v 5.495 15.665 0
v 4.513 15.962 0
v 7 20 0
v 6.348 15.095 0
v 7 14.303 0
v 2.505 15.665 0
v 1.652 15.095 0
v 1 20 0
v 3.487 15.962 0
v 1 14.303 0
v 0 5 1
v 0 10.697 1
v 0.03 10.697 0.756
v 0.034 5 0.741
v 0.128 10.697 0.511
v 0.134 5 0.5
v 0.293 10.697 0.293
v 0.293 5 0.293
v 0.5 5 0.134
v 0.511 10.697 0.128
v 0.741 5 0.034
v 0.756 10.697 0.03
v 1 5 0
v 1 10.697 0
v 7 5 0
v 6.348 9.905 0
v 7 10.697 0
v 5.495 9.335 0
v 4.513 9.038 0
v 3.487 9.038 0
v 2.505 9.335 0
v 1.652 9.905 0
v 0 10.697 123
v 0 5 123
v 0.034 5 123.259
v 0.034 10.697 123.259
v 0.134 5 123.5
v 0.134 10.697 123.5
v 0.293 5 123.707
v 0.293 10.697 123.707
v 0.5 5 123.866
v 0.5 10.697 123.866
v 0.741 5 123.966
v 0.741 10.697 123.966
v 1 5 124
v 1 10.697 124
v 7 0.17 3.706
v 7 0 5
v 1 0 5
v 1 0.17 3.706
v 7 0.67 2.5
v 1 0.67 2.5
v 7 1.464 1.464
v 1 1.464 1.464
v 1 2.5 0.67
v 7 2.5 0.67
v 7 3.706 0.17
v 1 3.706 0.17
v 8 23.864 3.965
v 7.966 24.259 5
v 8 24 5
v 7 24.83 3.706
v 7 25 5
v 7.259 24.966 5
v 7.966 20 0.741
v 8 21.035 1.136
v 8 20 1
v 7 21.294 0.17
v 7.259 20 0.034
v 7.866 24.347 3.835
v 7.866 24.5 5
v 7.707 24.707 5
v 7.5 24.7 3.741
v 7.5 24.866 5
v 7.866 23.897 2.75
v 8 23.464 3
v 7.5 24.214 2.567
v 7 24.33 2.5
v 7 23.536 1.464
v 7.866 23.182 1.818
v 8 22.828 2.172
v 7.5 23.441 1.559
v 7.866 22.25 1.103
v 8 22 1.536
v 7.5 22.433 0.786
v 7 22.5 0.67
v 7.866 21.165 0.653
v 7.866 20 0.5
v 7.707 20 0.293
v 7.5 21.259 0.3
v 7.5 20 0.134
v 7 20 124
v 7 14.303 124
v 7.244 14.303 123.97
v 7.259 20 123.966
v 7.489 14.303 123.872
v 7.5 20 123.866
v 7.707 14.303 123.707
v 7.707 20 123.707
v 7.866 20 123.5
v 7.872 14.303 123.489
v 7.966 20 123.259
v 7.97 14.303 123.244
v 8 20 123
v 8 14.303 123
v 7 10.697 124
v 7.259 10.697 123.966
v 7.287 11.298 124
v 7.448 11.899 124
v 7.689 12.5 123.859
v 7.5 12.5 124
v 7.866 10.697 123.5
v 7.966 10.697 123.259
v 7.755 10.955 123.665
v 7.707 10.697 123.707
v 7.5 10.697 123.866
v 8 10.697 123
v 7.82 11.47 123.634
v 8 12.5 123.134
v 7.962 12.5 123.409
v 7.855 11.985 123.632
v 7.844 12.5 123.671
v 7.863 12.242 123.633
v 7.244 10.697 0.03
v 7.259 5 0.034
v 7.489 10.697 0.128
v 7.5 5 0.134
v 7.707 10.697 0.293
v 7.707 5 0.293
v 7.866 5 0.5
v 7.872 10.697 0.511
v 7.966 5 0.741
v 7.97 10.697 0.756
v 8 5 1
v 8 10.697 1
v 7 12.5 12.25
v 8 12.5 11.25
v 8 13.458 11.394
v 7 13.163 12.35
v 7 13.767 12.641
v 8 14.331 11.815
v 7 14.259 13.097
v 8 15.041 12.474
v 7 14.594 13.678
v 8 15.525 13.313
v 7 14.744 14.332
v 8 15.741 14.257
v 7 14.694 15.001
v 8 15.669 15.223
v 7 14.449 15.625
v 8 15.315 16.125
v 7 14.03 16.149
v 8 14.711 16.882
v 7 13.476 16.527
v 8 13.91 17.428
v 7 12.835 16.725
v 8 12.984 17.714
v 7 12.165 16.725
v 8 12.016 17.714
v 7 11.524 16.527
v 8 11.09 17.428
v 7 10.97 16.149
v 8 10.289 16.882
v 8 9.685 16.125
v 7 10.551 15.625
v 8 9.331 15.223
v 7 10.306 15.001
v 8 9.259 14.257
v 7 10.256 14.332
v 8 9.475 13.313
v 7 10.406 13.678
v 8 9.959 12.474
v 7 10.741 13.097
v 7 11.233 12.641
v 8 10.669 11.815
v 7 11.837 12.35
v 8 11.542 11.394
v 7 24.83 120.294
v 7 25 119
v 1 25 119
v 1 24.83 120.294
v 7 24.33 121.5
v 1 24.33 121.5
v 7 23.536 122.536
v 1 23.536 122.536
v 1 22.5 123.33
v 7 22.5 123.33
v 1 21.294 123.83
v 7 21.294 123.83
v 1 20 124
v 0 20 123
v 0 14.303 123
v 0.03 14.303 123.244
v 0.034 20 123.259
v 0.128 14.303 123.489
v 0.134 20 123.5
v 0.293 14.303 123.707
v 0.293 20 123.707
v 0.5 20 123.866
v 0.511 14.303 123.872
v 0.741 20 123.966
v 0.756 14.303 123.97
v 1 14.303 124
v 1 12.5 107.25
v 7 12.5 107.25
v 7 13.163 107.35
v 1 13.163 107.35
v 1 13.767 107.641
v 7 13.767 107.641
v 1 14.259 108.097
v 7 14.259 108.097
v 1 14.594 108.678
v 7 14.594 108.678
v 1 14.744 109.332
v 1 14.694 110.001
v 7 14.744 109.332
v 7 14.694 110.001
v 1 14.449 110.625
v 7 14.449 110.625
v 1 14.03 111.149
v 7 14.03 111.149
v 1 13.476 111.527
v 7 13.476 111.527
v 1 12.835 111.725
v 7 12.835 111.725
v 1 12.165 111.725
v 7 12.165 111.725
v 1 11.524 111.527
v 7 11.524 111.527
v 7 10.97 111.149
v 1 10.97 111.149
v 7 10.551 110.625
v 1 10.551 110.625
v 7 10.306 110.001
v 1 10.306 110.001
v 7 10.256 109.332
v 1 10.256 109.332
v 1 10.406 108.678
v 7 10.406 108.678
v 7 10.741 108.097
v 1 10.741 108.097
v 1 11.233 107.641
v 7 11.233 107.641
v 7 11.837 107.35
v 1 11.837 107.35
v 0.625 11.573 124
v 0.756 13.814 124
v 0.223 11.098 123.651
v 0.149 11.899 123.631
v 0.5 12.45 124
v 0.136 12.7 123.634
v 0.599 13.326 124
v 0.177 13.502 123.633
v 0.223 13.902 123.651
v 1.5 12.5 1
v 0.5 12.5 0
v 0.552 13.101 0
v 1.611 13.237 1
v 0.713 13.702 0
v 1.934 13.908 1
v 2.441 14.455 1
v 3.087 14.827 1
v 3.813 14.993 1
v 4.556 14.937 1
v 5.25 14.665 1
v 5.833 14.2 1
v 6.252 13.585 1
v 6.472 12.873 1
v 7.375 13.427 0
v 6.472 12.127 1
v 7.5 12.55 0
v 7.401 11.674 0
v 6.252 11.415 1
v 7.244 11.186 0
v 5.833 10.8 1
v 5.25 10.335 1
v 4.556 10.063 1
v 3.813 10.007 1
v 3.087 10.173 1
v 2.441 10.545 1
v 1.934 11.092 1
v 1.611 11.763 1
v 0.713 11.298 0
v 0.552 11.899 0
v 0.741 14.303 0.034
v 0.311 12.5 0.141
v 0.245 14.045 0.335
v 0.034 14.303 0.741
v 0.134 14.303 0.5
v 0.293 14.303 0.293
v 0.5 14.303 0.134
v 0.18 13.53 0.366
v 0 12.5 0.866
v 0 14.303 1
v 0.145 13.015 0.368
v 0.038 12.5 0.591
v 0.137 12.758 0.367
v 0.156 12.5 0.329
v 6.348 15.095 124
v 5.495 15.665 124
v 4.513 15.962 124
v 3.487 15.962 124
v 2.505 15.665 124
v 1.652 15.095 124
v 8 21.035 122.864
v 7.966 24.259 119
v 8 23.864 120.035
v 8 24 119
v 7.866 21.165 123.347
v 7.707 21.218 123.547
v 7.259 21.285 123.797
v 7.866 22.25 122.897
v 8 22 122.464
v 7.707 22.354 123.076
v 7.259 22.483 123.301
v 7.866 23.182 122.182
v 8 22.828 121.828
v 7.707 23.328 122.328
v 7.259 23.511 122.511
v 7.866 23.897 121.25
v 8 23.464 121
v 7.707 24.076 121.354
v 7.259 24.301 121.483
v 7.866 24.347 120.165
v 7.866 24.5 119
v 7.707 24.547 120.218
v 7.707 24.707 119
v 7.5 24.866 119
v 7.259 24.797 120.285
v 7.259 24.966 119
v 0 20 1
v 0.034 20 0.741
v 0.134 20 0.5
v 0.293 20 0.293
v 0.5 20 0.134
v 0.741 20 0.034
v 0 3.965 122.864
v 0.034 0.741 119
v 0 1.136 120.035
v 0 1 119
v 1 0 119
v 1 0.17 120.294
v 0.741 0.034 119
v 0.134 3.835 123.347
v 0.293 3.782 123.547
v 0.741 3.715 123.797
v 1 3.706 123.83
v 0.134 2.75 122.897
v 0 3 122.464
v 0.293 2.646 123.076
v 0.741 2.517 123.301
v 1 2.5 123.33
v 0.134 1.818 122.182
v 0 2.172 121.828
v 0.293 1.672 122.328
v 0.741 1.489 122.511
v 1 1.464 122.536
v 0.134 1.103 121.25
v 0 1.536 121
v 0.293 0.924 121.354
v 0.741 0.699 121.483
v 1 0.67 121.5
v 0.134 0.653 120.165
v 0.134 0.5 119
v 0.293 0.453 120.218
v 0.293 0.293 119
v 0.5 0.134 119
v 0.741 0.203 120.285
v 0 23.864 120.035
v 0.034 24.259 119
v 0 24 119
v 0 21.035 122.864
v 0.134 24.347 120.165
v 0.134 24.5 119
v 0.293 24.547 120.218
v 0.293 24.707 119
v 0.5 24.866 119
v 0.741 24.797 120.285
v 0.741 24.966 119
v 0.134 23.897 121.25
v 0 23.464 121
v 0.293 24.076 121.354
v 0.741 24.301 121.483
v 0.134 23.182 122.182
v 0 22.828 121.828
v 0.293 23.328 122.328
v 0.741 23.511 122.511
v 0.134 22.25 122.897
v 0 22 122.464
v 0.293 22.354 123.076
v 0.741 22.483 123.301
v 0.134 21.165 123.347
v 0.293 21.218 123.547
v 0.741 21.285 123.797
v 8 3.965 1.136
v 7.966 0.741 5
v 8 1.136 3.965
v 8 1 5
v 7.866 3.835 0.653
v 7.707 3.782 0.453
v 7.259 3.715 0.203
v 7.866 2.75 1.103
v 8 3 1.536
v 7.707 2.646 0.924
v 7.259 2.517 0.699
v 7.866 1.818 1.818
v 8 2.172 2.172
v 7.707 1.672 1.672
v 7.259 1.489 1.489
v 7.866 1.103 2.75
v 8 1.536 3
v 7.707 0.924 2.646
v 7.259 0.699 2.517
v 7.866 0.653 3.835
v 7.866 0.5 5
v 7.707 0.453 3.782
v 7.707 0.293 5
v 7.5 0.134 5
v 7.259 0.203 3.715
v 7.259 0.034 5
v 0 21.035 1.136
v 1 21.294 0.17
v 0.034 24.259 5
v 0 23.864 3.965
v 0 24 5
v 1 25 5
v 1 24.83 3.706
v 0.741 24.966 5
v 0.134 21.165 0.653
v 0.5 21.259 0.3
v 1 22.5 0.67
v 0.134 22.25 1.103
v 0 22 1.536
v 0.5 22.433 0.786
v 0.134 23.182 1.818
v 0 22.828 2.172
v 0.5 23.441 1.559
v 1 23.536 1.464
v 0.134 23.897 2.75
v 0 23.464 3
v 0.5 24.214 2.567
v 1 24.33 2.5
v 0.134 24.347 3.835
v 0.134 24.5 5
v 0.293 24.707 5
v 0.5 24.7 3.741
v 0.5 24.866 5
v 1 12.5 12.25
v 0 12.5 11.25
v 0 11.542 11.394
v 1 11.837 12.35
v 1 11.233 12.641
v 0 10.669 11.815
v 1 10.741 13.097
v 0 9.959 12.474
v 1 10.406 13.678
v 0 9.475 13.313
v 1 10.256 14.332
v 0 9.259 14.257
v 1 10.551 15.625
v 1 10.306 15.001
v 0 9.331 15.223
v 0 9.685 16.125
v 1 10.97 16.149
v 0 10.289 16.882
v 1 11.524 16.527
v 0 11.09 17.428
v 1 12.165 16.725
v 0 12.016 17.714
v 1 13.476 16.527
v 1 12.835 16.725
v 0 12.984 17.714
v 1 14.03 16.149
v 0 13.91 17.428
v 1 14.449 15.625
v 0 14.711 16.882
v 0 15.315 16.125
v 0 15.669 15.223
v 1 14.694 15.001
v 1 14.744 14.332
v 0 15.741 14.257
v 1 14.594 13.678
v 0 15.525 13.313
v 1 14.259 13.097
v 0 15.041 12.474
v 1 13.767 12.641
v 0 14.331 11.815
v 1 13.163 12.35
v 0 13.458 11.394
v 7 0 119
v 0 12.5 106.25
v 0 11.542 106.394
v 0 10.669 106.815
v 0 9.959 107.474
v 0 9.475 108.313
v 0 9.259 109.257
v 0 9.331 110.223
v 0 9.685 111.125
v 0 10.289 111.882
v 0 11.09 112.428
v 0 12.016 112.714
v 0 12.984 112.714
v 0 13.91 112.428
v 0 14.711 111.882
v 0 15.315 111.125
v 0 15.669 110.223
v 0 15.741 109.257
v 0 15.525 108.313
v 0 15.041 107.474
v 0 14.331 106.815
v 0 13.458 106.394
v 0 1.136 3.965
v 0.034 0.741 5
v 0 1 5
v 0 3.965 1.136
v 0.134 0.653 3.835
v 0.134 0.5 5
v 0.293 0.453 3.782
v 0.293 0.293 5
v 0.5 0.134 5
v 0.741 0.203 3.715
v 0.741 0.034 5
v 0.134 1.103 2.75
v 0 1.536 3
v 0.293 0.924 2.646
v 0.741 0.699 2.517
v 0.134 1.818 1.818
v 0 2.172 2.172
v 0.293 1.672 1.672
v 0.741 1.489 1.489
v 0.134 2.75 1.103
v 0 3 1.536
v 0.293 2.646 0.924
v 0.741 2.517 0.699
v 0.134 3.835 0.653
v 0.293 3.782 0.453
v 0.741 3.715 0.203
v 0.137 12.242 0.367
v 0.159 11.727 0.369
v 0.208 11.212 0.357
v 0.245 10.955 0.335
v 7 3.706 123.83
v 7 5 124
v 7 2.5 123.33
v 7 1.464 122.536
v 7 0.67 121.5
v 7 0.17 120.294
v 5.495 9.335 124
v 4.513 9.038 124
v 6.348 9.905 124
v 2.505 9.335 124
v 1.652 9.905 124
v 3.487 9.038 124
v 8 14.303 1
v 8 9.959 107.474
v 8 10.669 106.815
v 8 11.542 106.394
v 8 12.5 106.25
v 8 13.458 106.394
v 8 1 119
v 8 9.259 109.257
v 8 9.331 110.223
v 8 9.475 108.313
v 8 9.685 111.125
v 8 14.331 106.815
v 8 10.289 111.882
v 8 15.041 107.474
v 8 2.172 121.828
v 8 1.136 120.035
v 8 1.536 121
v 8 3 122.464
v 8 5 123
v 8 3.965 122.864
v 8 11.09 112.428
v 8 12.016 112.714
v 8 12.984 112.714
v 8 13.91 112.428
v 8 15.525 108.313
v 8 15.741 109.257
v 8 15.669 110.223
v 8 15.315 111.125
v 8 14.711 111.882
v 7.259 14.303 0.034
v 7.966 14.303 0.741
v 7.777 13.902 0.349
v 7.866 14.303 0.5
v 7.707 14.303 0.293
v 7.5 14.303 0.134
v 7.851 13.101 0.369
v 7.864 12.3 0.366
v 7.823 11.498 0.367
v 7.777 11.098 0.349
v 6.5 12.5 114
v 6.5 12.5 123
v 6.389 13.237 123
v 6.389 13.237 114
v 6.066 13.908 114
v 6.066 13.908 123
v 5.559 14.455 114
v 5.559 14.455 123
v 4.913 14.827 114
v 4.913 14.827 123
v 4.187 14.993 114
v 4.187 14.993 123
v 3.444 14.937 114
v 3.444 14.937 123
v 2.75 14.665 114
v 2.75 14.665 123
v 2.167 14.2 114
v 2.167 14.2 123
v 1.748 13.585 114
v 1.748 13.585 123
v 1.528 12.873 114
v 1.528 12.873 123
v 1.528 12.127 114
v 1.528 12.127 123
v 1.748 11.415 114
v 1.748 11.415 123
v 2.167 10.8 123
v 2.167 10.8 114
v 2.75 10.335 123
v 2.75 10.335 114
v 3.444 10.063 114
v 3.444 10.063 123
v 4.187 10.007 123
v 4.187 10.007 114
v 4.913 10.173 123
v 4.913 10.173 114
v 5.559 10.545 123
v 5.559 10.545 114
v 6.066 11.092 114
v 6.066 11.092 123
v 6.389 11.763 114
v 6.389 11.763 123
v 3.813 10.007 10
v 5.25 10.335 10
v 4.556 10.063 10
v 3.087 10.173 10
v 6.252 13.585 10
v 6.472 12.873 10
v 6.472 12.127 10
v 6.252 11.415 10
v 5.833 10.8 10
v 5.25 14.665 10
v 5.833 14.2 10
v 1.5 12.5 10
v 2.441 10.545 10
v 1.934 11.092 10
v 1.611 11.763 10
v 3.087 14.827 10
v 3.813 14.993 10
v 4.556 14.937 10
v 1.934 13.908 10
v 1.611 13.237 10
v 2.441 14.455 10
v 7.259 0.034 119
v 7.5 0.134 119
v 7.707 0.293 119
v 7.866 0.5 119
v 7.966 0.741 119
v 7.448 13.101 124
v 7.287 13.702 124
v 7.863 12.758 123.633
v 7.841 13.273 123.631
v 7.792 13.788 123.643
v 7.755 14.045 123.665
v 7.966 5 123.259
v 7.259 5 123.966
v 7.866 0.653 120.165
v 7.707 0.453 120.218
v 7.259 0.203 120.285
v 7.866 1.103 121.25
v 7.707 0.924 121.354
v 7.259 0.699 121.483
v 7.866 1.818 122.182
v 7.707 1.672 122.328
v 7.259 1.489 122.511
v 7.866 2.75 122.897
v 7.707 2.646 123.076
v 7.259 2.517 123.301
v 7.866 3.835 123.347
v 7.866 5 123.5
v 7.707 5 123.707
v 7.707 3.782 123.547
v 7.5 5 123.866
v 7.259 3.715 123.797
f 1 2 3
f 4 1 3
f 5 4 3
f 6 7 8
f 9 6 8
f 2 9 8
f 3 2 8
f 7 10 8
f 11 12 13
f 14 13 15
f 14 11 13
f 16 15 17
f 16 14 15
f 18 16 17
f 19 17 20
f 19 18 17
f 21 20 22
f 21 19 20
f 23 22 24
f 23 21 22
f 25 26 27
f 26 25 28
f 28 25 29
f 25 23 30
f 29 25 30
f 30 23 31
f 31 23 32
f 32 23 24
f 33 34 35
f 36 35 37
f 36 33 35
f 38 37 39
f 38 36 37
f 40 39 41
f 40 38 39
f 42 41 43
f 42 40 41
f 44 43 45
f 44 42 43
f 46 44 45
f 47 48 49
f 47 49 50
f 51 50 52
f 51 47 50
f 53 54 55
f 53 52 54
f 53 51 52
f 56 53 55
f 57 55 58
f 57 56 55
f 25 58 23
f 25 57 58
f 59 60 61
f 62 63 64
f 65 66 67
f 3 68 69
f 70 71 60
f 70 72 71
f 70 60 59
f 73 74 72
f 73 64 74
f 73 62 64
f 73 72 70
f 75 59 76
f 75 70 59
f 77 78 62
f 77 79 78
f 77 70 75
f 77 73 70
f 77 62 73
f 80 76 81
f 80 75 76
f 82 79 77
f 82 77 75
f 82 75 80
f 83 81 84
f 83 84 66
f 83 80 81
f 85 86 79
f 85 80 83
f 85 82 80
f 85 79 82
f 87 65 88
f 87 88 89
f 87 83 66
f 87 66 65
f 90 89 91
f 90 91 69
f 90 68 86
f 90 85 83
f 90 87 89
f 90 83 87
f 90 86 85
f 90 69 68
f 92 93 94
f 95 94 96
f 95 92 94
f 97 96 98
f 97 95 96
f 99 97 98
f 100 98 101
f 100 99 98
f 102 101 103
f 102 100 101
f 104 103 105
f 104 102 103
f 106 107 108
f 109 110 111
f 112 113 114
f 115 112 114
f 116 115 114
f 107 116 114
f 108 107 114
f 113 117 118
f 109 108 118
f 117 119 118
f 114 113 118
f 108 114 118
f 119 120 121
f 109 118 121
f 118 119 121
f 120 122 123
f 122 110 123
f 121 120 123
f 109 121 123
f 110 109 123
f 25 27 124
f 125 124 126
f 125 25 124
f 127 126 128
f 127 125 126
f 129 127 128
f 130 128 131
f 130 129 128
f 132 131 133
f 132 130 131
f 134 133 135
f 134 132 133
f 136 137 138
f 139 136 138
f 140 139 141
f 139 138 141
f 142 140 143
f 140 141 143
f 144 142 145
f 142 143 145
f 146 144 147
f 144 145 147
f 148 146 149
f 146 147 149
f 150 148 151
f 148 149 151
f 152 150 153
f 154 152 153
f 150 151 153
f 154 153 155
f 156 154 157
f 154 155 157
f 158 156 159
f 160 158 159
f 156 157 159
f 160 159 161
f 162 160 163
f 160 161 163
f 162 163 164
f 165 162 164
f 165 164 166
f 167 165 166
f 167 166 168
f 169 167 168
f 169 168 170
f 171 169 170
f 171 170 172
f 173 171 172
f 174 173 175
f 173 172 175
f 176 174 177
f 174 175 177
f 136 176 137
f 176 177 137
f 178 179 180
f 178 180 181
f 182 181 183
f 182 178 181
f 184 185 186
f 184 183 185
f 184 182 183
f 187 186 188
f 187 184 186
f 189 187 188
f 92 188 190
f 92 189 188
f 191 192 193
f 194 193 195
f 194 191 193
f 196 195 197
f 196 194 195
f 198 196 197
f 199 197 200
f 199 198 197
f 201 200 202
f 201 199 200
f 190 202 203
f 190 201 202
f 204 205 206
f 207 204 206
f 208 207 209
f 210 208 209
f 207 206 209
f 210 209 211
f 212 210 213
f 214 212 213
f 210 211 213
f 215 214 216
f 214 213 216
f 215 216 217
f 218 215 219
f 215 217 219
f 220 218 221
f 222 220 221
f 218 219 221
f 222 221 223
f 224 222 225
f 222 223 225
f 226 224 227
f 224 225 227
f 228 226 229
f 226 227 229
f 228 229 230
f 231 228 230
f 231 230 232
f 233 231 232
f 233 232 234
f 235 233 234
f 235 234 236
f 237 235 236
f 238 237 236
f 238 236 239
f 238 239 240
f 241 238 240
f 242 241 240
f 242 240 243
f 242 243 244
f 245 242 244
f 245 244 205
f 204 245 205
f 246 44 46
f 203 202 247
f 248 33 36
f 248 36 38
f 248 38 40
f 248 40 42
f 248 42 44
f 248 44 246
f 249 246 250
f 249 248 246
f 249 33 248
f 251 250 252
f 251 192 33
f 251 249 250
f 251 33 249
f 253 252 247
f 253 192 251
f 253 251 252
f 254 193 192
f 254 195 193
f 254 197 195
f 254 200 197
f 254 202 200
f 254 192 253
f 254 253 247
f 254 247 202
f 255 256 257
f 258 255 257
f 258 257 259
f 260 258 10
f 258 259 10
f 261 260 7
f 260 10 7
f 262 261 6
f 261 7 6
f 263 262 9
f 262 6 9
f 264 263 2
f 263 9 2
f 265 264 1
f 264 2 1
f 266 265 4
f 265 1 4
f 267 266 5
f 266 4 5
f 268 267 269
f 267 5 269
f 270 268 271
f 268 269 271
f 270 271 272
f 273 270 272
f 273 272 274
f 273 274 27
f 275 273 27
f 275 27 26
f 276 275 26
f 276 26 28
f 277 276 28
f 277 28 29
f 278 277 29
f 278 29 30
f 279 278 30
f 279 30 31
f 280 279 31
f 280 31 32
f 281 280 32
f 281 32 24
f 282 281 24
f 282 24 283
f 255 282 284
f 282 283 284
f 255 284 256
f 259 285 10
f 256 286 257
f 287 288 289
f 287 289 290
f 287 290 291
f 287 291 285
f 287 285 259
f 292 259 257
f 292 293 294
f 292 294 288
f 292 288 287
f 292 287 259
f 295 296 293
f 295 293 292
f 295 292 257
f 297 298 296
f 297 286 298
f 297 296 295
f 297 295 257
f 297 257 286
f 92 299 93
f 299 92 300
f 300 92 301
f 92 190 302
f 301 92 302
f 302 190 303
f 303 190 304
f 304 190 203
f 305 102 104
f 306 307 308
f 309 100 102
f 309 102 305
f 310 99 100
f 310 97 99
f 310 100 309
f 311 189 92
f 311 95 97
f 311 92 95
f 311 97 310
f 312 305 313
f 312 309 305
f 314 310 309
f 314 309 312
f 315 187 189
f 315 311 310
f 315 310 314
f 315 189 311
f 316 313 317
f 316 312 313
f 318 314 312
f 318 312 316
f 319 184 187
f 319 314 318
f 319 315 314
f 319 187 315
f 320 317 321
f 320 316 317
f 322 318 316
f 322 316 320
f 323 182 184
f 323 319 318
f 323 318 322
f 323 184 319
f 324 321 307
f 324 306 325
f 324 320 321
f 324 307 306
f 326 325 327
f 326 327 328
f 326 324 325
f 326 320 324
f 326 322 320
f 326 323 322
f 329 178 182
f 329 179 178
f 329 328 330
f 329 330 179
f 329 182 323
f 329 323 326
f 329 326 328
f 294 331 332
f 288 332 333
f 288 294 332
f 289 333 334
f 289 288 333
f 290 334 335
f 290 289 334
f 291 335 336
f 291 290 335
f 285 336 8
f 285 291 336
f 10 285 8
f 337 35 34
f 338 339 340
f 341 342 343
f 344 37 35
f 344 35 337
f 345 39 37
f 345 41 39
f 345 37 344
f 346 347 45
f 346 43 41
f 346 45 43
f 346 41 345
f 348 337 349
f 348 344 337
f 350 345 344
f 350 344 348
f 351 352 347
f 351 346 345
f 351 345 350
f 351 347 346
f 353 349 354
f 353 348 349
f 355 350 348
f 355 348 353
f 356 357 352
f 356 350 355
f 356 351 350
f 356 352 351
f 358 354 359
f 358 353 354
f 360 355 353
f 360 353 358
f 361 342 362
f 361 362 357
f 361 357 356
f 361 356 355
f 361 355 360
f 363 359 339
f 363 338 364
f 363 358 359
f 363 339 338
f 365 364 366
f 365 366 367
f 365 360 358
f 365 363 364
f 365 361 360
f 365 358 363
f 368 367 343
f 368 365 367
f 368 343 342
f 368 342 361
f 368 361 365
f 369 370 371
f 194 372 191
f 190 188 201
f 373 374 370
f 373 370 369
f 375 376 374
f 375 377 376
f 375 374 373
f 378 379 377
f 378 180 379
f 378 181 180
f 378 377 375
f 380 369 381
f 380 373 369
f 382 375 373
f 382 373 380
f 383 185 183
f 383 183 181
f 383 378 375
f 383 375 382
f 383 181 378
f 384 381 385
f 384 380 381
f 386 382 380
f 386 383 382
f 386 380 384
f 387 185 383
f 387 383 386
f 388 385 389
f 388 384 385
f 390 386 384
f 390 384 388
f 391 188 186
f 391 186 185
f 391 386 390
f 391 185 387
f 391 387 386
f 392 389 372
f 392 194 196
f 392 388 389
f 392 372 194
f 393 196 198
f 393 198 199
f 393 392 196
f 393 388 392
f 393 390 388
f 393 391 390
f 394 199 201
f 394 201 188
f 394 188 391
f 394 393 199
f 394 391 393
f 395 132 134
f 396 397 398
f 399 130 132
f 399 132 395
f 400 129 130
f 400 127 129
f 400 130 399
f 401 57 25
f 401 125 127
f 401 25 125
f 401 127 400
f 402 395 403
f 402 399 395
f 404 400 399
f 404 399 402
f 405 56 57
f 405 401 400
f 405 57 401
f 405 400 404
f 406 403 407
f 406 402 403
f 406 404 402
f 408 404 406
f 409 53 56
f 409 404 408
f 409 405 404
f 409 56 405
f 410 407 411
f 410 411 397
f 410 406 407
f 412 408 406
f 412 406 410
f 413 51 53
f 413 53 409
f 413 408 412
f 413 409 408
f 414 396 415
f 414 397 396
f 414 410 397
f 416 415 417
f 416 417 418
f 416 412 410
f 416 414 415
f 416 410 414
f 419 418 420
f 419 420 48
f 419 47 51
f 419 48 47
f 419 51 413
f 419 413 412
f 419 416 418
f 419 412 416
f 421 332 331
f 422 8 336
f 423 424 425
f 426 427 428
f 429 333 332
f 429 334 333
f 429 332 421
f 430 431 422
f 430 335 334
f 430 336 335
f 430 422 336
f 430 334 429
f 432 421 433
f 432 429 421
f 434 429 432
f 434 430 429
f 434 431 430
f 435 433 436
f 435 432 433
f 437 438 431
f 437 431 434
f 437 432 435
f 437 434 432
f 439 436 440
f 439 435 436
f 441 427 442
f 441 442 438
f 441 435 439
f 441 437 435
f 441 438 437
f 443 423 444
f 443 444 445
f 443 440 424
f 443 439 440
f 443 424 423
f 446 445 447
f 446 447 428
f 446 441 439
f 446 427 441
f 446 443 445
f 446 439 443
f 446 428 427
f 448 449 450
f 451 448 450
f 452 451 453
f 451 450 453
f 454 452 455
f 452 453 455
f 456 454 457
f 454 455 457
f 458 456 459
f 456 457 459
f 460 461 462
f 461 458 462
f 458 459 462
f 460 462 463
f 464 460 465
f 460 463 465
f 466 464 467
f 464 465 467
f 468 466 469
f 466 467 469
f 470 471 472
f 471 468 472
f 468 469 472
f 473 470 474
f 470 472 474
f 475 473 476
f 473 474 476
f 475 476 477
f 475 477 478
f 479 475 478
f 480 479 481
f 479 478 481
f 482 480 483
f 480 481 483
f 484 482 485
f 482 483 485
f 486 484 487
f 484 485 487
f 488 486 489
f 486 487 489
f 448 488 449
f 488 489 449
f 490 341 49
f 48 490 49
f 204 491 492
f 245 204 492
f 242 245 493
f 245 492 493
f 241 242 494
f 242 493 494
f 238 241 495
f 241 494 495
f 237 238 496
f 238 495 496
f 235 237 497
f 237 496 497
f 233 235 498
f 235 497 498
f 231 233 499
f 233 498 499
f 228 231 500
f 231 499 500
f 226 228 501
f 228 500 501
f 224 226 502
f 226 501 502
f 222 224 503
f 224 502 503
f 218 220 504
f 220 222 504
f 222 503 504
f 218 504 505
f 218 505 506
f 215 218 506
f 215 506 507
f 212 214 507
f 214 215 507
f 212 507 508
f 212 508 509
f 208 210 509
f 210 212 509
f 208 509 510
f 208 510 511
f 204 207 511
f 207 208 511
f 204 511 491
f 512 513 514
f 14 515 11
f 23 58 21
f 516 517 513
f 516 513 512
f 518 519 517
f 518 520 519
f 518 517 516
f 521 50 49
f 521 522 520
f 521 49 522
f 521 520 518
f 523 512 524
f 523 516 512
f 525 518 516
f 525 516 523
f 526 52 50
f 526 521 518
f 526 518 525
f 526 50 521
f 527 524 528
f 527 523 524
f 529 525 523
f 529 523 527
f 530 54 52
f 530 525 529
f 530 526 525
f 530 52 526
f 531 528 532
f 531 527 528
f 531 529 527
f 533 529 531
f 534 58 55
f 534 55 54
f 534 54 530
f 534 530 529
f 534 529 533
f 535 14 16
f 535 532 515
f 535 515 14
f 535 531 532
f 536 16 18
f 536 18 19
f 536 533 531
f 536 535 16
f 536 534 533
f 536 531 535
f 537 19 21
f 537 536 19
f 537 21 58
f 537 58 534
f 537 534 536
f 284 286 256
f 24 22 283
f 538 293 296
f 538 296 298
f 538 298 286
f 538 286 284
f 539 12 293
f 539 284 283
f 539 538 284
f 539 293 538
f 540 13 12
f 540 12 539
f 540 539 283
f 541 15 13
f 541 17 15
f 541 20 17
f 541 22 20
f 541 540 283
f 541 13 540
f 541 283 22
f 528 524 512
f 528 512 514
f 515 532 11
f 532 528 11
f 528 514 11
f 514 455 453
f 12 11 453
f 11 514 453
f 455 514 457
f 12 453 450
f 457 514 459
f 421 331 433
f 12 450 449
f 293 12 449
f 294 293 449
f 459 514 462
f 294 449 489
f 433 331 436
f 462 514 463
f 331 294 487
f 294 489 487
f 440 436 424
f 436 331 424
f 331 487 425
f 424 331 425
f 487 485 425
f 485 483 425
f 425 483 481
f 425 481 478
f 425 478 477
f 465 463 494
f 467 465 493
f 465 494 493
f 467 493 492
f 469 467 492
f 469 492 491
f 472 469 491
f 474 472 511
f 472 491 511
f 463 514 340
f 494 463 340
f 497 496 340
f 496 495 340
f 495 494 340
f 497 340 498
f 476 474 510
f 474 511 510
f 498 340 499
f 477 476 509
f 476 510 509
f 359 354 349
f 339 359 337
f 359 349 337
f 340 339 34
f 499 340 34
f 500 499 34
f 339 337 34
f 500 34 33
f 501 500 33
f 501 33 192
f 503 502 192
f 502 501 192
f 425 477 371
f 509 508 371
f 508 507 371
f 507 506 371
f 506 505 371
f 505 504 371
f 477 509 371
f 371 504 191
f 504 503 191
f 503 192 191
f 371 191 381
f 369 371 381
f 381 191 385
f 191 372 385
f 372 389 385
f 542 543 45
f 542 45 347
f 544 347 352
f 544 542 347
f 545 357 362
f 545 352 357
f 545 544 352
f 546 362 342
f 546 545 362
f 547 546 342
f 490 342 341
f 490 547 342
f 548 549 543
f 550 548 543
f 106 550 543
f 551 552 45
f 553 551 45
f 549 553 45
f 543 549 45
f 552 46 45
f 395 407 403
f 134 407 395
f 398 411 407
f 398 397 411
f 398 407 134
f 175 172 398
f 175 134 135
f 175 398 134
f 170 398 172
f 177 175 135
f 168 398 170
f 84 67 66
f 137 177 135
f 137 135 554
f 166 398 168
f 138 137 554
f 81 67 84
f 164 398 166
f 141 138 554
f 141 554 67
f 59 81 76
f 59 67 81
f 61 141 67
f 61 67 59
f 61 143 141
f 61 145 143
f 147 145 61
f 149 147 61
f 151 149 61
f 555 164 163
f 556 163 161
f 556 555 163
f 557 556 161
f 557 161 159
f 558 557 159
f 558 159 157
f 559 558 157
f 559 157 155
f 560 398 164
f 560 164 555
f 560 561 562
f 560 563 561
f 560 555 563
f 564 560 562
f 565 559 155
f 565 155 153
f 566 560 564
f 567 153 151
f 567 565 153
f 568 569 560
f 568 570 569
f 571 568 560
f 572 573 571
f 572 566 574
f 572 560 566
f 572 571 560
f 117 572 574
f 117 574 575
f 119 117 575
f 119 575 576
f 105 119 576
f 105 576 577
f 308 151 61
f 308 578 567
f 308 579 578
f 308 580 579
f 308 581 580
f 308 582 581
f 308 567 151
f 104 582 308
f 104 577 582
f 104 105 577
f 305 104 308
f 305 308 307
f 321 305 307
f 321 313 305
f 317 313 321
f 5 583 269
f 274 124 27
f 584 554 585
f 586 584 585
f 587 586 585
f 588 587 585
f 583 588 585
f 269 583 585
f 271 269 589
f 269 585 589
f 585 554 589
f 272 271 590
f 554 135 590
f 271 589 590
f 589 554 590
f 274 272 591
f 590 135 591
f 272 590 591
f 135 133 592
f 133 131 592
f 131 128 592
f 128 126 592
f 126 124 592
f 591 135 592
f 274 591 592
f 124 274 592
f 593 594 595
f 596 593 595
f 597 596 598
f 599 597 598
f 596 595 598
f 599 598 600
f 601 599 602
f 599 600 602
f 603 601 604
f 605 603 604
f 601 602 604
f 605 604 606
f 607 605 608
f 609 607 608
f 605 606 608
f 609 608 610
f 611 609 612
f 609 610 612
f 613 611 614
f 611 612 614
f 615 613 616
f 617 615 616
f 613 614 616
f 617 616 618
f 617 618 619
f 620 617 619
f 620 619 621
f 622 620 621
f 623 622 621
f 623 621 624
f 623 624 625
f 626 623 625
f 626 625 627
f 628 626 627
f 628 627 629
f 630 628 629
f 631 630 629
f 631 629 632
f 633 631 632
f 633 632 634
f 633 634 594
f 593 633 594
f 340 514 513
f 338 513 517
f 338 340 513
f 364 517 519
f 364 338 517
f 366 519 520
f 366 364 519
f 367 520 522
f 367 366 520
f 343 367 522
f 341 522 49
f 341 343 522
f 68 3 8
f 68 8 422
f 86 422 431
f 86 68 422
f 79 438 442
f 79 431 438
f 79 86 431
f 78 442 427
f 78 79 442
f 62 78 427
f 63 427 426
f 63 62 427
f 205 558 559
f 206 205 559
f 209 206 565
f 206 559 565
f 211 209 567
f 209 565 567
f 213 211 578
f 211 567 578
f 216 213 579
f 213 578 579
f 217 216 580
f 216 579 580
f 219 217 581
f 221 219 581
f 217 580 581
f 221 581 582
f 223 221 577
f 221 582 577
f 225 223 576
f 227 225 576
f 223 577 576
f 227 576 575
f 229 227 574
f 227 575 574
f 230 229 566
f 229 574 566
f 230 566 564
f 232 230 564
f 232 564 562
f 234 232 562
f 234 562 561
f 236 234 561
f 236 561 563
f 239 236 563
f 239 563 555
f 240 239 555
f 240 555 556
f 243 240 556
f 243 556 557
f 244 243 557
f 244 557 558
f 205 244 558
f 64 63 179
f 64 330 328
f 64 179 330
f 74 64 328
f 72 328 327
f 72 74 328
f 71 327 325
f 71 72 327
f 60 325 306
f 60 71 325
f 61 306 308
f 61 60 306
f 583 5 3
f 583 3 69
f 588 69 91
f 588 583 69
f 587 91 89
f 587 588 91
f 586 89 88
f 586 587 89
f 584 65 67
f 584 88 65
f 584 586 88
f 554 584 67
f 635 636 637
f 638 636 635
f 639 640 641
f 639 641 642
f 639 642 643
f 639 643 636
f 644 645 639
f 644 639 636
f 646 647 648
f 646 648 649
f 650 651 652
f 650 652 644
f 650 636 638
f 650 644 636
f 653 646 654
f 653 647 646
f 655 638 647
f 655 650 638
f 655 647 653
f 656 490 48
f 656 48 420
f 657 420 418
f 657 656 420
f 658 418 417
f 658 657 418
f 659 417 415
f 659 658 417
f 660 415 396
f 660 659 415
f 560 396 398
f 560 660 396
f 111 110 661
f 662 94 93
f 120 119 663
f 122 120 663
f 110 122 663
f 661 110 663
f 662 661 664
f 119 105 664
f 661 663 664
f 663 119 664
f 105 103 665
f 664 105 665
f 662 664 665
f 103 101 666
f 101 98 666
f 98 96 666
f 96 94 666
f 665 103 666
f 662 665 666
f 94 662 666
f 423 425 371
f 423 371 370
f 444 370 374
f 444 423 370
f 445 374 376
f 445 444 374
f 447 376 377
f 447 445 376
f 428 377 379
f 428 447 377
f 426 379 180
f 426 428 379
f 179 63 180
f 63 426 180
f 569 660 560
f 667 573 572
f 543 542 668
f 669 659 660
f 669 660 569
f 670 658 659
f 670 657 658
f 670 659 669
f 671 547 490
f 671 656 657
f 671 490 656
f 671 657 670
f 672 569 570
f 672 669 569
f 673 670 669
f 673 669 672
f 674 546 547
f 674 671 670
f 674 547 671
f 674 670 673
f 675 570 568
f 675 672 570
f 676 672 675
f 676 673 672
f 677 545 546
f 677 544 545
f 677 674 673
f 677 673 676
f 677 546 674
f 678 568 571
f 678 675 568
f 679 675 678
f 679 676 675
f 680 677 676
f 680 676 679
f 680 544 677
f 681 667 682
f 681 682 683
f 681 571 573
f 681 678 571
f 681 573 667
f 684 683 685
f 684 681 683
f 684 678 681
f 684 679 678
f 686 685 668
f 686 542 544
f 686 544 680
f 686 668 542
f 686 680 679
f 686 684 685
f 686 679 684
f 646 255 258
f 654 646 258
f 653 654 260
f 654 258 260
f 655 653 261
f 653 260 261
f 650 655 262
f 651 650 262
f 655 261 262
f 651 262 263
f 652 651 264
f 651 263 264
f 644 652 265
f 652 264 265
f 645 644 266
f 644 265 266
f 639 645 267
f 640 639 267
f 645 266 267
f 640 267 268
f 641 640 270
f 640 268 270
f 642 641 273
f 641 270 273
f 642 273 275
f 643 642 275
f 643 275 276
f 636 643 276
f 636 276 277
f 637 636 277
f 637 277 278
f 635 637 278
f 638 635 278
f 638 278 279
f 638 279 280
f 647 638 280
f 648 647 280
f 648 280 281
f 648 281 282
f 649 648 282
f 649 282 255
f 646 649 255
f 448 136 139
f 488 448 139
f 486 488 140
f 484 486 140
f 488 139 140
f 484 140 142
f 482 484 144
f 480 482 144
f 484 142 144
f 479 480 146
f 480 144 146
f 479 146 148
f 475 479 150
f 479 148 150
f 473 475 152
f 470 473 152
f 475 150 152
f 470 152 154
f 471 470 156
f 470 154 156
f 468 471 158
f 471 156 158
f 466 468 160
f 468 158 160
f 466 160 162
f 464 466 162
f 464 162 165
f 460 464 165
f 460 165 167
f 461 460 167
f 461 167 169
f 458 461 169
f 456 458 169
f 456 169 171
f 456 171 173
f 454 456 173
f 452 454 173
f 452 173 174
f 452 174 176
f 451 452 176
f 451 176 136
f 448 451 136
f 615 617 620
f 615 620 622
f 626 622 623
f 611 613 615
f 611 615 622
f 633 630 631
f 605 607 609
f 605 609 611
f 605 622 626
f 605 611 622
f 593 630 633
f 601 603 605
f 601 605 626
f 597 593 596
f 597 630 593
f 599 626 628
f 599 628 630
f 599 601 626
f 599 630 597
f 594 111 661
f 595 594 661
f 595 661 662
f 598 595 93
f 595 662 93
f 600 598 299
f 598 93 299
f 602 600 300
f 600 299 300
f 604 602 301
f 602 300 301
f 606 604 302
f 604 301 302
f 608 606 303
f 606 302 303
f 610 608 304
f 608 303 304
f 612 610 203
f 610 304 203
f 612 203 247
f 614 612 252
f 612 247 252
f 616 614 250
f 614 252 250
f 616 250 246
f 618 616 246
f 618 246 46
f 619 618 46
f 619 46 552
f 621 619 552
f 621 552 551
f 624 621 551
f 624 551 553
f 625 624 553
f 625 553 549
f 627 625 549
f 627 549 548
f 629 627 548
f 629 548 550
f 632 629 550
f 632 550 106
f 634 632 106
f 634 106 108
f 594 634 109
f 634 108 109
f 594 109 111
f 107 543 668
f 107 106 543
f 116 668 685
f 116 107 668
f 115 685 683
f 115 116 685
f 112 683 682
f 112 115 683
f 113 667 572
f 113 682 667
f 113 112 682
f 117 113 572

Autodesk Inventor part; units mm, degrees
ref_plane "YZ Plane" through (0, 0, 0) normal (1, 0, 0) x (0, 1, 0)
ref_plane "XZ Plane" through (0, 0, 0) normal (0, 1, 0) x (-1, 0, 0)
ref_plane "XY Plane" through (0, 0, 0) normal (0, 0, 1) x (1, 0, 0)
sketch "Skizze1" plane through (0, 0, 0) normal (1, 0, 0) x (0, 1, 0)
  line L0 (0, 0) -> (25, 0)
  line L1 (25, 0) -> (25, 124)
  line L2 (25, 124) -> (0, 124)
  line L3 (0, 124) -> (0, 0)
  dimension "d0" = 25
  dimension "d1" = 124
extrude "Extrusion1" add sketch "Skizze1" along normal blind 8
fillet "Rundung1" radius 5 4 edges at (4, 25, 124) (4, 0, 124) (4, 25, 0) (4, 0, 0)
sketch "Skizze2" plane through (8, 0, 0) normal (1, 0, 0) x (0, 0, -1)
  circle A0 centre (-14.5, 12.5) radius 2.25
  circle A1 centre (-109.5, 12.5) radius 2.25
  line L0 (-124, 20) -> (-124, 5) projected
  line L1 (-5, 25) -> (-119, 25) projected
  point P0 (0, 0)
  dimension "d5" = 4.5
  dimension "d6" = 4.5
  dimension "d7" = 95
  dimension "d8" = 14.5
  dimension "d9" = 12.5
  dimension "d10" = 12.5
extrude "Extrusion2" cut sketch "Skizze2" against normal through all
sketch "Skizze3" plane through (0, 5, 0) normal (0, 0, -1) x (-1, 0, 0)
  circle A0 centre (-4, 7.5) radius 2.5
  line L0 (0, 20) -> (-8, 20) projected
  line L1 (-8, 0) -> (-8, 15) projected
  point P0 (0, -5)
  point P1 (-4, 20)
  dimension "d14" = 5
  dimension "d15" = 12.5
  dimension "d16" = 4
extrude "Extrusion3" cut sketch "Skizze3" against normal blind 10
sketch "Skizze4" plane through (0, 5, 124) normal (0, 0, 1) x (1, 0, 0)
  circle A0 centre (4, 7.5) radius 2.5 projected
  point P0 (0, -5)
extrude "Extrusion4" cut sketch "Skizze4" against normal blind 10
chamfer "Fase1" distance 1 angle 45 2 edges at (1.5, 12.5, 124) (6.5, 12.5, 0)
fillet "Rundung3" radius 1 16 edges at (8, 23.5355, 1.4645) (8, 25, 62) (8, 23.5355, 122.5355) (8, 12.5, 124) (8, 1.4645, 122.5355) (8, 0, 62) (8, 1.4645, 1.4645) (8, 12.5, 0) (0, 23.5355, 1.4645) (0, 25, 62) (0, 23.5355, 122.5355) (0, 12.5, 124) (0, 1.4645, 122.5355) (0, 0, 62) (0, 1.4645, 1.4645) (0, 12.5, 0)
chamfer "Fase2" distance 1 angle 45 4 edges at (8, 12.5, 111.75) (8, 12.5, 16.75) (0, 12.5, 16.75) (0, 12.5, 111.75)
properties part number "Camera_Adapter"
